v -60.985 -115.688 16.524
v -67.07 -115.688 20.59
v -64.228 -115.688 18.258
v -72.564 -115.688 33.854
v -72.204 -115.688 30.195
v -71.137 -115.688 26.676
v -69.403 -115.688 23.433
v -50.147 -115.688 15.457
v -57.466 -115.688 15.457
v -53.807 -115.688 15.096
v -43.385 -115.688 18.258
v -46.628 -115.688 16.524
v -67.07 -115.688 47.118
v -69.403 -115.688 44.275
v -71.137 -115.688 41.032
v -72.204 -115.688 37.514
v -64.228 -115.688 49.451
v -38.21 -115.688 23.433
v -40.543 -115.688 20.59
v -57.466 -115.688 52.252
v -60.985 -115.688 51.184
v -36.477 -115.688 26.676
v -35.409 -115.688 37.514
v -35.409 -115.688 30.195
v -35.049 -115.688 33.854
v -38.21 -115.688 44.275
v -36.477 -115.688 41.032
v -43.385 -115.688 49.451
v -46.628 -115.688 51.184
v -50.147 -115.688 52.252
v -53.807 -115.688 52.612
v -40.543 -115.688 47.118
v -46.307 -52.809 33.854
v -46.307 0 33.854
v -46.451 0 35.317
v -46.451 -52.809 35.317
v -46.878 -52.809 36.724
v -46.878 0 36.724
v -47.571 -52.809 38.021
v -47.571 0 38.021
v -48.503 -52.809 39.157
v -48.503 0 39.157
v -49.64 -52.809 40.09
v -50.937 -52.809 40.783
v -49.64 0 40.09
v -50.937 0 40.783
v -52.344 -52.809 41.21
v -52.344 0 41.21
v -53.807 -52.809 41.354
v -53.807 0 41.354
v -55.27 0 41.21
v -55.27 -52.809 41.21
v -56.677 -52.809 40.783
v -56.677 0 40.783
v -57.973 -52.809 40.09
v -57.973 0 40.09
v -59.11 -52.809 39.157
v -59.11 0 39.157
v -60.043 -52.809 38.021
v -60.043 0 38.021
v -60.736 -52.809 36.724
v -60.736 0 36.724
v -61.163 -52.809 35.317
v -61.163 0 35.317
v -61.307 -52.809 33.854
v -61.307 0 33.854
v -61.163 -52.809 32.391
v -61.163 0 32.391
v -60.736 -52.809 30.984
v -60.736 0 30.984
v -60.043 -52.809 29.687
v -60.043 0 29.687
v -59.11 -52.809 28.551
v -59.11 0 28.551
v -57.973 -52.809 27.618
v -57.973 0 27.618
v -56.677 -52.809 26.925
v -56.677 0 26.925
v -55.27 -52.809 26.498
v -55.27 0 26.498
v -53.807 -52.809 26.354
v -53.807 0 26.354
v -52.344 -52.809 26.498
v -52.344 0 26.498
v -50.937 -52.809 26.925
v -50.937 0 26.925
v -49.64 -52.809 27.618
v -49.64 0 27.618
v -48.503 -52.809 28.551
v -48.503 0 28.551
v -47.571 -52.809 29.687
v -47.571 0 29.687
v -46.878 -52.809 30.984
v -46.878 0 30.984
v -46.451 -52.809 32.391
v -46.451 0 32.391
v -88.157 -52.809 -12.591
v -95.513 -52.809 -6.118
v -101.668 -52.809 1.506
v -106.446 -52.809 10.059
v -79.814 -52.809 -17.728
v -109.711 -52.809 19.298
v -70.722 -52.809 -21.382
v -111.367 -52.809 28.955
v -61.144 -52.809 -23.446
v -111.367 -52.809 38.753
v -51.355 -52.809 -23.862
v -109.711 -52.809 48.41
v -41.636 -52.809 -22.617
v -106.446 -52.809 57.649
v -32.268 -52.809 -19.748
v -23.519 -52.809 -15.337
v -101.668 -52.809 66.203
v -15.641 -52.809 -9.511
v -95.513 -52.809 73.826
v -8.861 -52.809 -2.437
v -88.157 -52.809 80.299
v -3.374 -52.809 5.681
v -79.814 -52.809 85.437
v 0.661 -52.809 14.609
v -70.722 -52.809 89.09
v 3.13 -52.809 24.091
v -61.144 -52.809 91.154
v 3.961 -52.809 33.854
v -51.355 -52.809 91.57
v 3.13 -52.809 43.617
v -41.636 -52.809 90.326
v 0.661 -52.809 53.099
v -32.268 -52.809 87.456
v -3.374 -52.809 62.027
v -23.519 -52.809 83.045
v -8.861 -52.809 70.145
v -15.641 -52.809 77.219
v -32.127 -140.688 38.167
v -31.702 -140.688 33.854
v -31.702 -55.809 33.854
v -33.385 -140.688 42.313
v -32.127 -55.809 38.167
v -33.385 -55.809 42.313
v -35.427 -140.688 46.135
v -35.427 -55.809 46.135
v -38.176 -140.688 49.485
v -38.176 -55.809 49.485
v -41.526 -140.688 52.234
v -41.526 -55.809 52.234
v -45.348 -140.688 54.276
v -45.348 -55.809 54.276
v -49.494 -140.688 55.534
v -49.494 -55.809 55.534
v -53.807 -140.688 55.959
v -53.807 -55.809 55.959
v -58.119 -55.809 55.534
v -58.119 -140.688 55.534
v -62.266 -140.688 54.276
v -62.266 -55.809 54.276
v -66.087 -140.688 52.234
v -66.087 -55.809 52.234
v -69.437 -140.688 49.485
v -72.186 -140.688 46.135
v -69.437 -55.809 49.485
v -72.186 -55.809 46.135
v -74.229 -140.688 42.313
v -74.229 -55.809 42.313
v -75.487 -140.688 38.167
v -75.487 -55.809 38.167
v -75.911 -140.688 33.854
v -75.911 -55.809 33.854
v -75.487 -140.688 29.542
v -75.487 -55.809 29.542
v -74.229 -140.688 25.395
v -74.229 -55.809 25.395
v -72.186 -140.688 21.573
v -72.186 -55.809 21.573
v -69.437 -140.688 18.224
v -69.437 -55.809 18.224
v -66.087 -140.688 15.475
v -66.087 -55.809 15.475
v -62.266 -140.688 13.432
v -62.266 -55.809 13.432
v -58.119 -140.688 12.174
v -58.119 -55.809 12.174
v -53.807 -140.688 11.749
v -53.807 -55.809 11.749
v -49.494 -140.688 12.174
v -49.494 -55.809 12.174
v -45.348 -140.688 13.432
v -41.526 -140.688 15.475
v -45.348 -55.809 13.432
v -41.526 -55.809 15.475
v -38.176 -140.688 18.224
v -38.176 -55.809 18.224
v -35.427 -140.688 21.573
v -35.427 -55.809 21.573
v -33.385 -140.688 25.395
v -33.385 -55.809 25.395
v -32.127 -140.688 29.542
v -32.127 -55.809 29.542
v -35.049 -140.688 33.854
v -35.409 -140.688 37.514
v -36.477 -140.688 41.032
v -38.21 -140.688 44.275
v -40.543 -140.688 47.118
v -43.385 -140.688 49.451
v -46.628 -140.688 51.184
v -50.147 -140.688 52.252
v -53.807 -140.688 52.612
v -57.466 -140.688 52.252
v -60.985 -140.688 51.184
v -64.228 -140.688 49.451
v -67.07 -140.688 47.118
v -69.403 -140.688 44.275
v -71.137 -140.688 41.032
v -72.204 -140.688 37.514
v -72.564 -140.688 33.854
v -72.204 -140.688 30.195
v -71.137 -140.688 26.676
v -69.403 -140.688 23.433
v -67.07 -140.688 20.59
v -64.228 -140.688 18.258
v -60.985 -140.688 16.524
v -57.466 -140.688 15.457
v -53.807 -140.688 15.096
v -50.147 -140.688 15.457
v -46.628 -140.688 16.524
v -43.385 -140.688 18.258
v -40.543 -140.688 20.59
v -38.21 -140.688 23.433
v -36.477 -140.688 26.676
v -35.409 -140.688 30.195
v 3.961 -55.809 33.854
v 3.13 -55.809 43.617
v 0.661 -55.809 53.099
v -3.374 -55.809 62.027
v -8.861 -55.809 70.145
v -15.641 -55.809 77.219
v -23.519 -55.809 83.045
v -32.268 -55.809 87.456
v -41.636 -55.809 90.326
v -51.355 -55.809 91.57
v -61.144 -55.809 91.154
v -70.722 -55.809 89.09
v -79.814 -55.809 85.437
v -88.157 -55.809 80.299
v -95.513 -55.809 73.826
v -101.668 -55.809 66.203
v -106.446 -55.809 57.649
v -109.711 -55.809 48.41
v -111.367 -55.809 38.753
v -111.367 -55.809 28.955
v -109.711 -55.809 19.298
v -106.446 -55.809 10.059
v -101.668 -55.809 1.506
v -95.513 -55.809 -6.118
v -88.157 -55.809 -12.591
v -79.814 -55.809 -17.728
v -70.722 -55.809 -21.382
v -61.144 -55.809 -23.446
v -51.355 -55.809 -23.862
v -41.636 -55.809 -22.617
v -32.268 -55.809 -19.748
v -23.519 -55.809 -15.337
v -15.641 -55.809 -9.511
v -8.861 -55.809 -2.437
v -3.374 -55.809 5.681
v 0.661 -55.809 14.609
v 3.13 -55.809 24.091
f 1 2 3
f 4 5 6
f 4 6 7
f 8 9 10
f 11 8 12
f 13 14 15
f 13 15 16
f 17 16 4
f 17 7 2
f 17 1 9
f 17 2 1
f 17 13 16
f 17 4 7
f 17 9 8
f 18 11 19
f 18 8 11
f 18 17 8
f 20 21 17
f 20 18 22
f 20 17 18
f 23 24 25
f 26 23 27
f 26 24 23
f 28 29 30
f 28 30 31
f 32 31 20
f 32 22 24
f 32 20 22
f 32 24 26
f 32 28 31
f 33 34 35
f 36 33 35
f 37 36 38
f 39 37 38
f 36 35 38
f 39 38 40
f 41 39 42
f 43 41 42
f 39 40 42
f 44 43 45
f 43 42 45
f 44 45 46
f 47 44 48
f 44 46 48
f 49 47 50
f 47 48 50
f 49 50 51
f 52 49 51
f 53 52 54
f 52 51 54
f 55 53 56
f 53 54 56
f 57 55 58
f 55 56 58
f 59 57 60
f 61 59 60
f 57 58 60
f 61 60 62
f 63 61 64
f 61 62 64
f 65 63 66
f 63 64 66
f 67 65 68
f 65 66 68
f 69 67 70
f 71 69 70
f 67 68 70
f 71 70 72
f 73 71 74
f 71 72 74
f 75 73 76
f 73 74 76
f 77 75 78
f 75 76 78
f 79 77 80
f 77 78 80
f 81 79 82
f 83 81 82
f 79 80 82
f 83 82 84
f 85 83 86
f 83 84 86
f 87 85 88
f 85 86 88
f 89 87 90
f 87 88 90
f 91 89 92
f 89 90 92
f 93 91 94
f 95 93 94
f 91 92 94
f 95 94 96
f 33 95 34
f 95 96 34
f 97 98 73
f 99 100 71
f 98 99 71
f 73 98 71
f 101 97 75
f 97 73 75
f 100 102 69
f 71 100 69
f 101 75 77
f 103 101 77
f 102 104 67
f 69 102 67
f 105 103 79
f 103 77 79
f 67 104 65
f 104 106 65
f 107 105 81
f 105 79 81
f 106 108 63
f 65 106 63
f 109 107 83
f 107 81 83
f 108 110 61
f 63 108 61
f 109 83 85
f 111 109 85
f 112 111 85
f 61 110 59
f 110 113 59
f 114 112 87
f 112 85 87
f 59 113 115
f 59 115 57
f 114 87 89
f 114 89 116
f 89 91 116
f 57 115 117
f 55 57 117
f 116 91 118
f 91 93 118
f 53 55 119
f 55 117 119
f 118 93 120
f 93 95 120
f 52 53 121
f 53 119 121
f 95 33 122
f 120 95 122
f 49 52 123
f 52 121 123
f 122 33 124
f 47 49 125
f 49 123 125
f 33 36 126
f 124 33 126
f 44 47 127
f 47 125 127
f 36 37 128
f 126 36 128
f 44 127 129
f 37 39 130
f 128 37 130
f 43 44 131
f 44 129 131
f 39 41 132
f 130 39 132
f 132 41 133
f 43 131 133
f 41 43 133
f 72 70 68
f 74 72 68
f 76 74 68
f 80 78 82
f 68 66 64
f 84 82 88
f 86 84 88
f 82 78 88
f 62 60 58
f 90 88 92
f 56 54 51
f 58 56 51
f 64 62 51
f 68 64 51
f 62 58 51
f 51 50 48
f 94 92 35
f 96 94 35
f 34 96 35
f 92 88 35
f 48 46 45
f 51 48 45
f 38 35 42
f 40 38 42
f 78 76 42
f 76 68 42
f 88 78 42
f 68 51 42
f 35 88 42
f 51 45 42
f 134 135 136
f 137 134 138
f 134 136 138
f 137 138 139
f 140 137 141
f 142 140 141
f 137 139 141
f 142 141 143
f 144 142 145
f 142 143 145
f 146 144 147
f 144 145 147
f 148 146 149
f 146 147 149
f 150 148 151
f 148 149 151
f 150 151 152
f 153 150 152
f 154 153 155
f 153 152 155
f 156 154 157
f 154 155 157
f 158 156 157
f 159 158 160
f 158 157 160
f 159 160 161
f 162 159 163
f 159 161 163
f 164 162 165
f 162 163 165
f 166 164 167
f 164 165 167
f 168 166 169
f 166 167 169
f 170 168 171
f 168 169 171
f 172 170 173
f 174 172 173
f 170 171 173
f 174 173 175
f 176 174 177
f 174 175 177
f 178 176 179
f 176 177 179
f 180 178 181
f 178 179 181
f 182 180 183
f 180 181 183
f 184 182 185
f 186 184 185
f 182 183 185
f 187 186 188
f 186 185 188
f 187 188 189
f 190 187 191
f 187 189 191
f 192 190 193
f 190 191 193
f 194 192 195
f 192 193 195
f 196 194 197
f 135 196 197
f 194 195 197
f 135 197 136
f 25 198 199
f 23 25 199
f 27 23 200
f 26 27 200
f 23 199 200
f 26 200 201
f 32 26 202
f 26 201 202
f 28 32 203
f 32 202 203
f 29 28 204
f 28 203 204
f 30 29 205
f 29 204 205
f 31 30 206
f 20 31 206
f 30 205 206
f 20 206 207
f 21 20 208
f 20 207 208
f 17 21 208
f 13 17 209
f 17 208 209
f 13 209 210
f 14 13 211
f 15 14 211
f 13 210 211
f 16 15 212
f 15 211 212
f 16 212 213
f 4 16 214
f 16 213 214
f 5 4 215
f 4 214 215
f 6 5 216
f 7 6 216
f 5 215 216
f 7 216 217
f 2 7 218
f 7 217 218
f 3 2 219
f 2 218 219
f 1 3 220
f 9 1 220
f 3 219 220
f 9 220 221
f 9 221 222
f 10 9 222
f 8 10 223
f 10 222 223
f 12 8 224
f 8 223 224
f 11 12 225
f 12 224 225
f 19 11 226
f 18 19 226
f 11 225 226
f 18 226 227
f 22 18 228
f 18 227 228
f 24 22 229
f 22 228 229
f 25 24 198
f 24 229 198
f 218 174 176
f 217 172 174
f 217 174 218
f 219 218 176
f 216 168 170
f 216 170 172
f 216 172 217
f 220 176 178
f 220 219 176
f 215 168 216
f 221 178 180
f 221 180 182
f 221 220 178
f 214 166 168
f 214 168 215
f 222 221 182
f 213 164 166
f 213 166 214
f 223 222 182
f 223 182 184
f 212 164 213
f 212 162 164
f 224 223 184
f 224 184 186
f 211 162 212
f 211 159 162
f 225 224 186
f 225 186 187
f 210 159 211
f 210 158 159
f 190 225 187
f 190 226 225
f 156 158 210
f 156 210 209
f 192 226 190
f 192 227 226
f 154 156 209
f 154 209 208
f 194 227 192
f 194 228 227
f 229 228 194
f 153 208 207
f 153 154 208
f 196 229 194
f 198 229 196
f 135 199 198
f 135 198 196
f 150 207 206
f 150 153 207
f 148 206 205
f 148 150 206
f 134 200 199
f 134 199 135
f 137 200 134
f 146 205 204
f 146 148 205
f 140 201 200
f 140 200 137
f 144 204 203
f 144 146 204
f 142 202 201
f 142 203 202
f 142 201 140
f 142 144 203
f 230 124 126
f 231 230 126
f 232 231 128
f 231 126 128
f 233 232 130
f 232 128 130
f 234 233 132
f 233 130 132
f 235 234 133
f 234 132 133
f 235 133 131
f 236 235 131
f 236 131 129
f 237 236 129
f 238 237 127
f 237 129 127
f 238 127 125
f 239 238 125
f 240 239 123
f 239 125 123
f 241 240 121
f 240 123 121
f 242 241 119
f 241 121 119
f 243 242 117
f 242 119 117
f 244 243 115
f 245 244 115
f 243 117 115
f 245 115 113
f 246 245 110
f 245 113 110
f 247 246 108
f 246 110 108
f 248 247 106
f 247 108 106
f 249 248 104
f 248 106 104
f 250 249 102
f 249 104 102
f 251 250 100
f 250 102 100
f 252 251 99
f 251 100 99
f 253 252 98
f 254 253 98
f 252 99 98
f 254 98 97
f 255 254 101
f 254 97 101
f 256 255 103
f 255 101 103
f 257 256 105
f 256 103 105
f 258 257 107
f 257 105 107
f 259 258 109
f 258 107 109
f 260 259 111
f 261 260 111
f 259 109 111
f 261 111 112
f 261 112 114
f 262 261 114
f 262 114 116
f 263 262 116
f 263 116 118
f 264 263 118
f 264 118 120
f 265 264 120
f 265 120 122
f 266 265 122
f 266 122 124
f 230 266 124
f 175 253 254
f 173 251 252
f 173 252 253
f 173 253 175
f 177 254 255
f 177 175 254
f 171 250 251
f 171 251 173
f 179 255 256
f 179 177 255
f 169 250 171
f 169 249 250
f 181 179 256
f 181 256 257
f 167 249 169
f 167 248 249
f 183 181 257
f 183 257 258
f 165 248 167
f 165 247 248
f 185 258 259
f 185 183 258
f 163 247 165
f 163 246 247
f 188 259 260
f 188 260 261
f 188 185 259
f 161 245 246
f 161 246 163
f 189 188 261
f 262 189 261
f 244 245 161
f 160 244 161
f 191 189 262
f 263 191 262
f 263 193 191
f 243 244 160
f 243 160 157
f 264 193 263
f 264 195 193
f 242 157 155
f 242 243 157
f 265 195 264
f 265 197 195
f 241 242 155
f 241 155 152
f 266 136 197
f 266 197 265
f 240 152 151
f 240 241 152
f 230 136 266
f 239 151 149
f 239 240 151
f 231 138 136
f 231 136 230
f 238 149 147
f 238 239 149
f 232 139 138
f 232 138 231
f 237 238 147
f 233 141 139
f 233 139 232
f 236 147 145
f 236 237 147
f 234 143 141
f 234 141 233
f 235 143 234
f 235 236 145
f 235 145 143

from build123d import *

# Parameters (mm, degrees)
F0_R     = 7.5
F1_DEPTH = 52.80856
F2_R     = 57.7679652565
F2_R_2   = 7.5
F3_DEPTH = 3
F4_R     = 22.1047770768
F5_DEPTH = 84.87969
F6_R     = 18.757754514
F7_DEPTH = 25


with BuildPart() as f1:
    # F0 (on Front) → F1 (new body)
    with BuildSketch(Plane.XZ):
        with Locations((-53.8066774607, 33.8541828096)):
            Circle(F0_R)
    extrude(amount=F1_DEPTH)

    # F2 (on face) → F3 (join)
    with BuildSketch(Plane.XZ.offset(52.80856)):
        with Locations((-53.8066774607, 33.8541828096)):
            Circle(F2_R)
        with Locations((-53.8066774607, 33.8541828096)):
            Circle(F2_R_2, mode=Mode.SUBTRACT)
        with Locations((-53.8066774607, 33.8541828096)):
            Circle(F2_R)
    extrude(amount=F3_DEPTH)

    # F4 (on face) → F5 (join)
    with BuildSketch(Plane.XZ.offset(55.80856)):
        with Locations((-53.8066774607, 33.8541828096)):
            Circle(F4_R)
    extrude(amount=F5_DEPTH)

    # F6 (on face) → F7 (cut)
    with BuildSketch(Plane.XZ.offset(140.68825)):
        with Locations((-53.8066774607, 33.8541828096)):
            Circle(F6_R)
    extrude(amount=-F7_DEPTH, mode=Mode.SUBTRACT)


solid = f1.part
